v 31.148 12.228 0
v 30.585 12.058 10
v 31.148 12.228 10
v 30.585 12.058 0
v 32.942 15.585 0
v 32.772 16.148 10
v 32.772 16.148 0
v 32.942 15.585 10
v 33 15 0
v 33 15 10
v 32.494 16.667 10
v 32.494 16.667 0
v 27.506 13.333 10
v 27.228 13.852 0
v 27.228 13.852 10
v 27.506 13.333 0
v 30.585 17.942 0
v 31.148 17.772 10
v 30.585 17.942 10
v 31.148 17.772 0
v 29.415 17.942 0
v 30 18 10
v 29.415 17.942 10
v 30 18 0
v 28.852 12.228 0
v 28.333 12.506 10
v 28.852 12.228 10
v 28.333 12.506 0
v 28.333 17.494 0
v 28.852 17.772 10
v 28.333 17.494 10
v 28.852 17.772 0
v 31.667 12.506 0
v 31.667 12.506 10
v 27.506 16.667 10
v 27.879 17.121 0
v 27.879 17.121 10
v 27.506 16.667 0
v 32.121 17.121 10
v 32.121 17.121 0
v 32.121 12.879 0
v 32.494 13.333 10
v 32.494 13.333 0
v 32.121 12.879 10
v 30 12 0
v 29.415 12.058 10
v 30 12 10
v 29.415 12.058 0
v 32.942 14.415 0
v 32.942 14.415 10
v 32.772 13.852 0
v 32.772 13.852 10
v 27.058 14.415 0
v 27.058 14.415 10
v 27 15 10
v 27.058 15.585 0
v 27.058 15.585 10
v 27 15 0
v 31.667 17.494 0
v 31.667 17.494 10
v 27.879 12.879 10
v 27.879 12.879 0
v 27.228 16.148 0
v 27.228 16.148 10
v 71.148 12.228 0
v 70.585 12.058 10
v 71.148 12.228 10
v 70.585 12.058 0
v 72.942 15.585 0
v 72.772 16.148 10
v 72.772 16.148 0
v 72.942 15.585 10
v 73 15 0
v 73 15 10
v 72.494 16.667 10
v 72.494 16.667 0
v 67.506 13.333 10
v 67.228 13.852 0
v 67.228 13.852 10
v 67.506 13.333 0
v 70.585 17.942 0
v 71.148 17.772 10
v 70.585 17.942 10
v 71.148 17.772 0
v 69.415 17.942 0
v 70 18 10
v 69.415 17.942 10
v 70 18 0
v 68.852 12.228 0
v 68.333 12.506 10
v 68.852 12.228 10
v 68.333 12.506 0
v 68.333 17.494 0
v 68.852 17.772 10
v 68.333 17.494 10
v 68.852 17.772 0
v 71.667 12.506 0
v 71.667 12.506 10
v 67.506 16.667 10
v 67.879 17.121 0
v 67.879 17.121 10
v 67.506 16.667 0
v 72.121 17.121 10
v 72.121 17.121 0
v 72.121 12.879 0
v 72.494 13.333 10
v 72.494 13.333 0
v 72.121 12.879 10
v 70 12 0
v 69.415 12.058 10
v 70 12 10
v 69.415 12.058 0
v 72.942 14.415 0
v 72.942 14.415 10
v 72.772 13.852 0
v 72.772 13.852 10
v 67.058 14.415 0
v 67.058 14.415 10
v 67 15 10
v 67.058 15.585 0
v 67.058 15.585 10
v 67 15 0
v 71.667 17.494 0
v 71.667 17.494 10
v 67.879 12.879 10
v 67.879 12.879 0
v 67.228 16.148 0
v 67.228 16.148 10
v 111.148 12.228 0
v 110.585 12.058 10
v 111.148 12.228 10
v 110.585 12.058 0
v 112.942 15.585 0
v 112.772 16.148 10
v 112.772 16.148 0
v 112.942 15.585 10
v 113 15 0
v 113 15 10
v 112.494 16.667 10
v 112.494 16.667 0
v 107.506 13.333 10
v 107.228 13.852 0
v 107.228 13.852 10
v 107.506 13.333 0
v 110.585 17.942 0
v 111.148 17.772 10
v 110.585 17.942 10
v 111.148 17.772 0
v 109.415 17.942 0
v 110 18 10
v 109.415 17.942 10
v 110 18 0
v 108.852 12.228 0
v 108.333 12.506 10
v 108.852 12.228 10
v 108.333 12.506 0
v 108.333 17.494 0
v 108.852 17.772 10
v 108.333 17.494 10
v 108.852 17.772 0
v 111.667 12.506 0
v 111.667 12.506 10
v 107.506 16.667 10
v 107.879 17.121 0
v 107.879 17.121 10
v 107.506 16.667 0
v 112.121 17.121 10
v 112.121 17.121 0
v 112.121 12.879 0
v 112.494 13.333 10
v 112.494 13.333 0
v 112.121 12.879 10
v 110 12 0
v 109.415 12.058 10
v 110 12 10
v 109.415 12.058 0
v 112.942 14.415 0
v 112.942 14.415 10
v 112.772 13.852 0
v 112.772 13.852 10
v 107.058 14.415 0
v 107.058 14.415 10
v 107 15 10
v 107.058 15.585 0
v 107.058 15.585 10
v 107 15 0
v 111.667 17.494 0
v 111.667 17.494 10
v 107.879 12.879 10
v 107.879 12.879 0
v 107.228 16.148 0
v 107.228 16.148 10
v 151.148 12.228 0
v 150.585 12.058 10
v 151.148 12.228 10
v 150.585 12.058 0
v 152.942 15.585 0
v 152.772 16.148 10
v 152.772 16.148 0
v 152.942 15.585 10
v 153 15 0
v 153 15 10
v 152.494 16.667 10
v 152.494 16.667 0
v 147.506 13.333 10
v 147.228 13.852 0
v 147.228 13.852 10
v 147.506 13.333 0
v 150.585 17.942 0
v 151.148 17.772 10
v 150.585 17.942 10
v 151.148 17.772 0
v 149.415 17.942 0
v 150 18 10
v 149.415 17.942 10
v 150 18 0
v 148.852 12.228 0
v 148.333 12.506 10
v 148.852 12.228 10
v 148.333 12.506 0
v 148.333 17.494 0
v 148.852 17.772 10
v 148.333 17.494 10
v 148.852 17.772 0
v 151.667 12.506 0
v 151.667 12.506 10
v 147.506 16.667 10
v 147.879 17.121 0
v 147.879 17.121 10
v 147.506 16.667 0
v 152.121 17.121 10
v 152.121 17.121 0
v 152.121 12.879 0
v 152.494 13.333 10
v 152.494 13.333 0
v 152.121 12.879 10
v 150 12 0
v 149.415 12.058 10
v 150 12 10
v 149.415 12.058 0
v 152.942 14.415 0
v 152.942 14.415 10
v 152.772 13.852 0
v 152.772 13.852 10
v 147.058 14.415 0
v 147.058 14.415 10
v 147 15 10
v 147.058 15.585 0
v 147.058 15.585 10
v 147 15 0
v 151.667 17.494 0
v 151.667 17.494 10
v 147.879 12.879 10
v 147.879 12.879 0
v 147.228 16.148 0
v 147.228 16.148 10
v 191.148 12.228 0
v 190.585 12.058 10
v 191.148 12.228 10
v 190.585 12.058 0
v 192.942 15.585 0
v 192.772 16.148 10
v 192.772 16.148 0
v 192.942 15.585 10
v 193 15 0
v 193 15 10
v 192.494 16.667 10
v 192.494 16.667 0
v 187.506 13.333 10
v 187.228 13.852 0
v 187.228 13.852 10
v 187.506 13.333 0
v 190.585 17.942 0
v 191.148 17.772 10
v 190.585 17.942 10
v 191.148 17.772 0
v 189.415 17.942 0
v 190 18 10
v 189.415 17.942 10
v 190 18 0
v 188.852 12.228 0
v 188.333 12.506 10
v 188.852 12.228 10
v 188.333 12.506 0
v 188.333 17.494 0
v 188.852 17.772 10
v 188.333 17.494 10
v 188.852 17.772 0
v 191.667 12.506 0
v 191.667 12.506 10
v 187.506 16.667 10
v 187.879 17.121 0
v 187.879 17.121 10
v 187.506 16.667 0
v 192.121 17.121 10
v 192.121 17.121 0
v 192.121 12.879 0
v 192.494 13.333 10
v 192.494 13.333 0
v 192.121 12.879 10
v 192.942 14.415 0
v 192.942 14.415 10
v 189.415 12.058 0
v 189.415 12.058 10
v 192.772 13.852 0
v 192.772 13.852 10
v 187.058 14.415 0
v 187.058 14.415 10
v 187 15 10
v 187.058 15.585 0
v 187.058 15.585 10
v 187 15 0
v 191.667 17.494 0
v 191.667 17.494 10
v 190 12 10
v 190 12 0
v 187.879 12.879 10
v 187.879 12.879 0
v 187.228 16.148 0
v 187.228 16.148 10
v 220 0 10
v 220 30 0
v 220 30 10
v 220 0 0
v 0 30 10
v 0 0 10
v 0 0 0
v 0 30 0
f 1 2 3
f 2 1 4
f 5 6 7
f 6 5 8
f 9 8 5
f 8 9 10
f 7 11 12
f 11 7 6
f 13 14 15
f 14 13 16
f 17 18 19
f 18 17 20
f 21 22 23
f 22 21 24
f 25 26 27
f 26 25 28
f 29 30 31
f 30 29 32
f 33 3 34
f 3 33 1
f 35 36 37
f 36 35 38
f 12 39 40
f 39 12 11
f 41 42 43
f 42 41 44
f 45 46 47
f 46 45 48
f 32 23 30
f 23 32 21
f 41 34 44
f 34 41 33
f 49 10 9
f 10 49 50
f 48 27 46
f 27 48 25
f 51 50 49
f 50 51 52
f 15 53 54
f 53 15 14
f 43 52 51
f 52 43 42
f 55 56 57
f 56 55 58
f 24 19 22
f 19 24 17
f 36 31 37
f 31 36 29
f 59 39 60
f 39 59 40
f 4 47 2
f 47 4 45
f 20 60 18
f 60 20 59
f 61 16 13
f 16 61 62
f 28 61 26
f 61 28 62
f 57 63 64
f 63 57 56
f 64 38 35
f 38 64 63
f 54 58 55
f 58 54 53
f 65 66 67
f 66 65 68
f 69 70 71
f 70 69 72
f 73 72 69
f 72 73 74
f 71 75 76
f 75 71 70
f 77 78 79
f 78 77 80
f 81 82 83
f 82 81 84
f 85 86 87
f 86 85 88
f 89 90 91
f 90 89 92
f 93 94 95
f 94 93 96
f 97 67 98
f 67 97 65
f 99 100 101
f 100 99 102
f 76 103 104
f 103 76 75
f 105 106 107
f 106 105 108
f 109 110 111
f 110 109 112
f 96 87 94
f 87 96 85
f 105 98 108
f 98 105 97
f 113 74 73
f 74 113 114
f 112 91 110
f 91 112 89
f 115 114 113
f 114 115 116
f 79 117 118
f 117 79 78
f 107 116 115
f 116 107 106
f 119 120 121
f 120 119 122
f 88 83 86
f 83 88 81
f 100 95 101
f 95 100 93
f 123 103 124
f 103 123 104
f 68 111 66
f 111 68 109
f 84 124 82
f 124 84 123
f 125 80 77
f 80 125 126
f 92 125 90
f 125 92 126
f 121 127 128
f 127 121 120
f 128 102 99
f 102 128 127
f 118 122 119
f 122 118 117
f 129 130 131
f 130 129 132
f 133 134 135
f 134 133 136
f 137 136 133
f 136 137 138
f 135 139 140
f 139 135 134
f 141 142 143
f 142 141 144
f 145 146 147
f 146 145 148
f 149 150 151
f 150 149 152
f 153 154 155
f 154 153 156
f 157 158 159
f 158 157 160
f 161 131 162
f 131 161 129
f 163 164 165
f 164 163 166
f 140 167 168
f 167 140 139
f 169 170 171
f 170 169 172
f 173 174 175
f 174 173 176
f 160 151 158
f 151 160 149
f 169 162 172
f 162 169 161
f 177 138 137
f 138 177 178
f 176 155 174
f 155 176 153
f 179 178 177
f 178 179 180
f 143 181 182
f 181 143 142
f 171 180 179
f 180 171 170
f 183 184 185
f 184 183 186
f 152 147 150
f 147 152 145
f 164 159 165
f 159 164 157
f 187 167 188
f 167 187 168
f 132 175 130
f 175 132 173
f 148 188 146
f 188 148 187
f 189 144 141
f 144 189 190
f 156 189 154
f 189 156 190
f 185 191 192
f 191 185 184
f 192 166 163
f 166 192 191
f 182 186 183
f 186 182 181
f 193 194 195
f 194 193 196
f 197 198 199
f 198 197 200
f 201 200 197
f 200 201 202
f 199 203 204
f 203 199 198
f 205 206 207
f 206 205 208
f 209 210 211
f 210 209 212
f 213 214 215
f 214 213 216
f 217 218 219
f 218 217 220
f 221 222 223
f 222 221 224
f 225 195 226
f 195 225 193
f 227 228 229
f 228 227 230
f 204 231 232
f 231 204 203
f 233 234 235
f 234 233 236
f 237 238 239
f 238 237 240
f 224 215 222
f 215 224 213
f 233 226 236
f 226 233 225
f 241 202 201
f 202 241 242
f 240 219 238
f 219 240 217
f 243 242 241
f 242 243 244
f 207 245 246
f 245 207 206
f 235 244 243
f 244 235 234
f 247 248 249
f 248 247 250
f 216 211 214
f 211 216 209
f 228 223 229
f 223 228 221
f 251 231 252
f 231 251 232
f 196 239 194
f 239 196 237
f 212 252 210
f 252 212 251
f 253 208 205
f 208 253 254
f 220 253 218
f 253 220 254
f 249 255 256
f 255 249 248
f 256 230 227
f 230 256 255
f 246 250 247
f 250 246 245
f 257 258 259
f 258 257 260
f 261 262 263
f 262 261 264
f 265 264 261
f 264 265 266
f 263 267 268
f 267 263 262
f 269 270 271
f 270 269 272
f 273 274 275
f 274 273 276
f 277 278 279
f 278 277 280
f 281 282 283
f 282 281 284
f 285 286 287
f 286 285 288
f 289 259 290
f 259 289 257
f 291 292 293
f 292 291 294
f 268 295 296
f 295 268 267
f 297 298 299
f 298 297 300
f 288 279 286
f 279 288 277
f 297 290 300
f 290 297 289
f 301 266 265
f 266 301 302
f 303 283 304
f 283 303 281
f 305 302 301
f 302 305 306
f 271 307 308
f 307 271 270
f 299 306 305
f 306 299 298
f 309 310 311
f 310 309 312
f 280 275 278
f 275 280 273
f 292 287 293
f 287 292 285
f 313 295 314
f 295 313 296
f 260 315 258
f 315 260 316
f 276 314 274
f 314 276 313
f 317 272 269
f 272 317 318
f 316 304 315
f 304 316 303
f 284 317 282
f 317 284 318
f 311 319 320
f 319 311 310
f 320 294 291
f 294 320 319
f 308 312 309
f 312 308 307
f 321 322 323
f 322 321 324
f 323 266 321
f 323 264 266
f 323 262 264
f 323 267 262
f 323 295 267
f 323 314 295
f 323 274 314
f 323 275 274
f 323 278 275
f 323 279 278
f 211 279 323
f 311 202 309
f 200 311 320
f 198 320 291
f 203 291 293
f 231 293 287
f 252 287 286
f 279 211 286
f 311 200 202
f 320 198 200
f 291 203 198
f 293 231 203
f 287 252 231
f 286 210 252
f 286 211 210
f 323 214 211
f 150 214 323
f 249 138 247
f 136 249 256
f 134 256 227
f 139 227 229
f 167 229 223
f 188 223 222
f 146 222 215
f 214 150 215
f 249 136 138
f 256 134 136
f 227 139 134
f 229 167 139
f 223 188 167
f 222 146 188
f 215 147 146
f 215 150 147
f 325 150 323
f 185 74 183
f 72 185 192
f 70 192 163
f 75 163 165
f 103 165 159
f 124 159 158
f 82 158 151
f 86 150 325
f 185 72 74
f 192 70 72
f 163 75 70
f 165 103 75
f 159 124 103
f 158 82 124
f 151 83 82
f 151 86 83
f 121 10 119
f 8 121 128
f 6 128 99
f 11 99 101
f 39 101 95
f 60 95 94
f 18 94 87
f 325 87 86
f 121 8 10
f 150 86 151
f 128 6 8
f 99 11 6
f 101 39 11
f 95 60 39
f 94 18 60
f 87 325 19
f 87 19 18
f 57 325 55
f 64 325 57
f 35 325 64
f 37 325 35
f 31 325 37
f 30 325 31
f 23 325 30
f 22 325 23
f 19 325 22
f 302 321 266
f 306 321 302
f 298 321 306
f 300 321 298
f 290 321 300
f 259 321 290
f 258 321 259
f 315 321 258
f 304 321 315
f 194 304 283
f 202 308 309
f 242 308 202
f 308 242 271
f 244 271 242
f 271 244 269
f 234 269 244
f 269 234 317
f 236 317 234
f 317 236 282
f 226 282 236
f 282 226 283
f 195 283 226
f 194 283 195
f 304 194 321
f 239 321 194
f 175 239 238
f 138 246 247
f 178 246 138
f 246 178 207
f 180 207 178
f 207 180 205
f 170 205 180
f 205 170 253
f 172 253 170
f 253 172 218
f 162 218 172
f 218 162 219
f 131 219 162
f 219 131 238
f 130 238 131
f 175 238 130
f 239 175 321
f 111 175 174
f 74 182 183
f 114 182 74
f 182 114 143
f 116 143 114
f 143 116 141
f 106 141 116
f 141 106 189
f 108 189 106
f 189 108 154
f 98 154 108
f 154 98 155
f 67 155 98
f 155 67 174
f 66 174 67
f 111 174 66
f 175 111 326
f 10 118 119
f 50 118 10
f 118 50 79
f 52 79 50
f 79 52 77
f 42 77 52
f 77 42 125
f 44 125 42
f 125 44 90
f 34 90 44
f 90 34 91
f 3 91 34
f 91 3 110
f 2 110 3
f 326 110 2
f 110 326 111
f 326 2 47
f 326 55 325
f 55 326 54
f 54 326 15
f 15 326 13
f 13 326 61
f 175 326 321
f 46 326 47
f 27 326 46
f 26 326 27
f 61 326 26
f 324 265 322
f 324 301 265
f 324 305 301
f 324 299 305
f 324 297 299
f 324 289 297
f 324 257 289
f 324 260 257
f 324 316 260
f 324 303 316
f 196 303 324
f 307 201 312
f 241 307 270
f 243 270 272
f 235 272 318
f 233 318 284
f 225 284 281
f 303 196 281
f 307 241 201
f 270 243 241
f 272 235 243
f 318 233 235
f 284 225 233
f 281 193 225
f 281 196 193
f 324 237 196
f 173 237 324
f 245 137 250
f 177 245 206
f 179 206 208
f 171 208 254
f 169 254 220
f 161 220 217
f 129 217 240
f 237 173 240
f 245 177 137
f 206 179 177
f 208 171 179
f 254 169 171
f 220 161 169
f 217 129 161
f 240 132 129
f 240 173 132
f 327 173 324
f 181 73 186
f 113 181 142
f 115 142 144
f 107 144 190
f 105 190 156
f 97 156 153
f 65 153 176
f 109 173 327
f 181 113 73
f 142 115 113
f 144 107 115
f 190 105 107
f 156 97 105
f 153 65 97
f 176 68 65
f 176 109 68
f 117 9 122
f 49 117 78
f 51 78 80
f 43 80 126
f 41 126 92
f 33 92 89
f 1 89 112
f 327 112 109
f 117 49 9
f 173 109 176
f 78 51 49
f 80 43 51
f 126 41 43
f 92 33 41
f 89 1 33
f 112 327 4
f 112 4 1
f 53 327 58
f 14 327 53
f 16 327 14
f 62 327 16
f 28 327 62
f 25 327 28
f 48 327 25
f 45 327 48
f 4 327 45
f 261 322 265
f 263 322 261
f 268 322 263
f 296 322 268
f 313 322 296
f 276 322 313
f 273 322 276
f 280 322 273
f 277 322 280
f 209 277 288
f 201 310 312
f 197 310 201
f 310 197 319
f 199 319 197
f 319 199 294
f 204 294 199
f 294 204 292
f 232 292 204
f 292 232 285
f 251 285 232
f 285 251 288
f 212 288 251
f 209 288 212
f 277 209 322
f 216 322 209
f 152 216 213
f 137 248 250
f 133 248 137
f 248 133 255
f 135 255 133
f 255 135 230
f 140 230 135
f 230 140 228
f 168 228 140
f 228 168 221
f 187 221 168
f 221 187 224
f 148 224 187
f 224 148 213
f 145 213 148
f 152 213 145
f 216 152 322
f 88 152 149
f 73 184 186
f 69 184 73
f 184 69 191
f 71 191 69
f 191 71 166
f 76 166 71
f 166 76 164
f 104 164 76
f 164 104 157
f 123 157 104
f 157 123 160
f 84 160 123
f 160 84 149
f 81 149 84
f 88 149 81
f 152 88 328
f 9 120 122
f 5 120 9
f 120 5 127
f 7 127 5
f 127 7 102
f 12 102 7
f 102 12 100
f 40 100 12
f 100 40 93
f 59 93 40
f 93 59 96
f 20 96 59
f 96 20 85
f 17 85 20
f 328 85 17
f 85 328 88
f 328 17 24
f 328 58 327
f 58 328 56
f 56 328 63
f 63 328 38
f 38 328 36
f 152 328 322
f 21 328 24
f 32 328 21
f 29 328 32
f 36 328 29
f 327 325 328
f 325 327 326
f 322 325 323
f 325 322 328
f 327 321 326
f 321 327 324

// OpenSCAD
$fn = 32;

// ----------------------------------------------------------------------
// Long rail: 200-250 mm mounting rail
// ----------------------------------------------------------------------

// --- parameters (mm) ---
rail_l = 220;             // rail length, X
rail_w = 30;              // rail width, Y
rail_t = 10;              // rail thickness, Z
hole_d = 6;               // mounting hole diameter
hole_start = 30;          // first hole offset from the end
hole_pitch = 40;          // hole pitch
holes = 5;                // number of holes

difference() {
  cube([rail_l, rail_w, rail_t]);
  for (i = [0 : holes - 1])
    translate([hole_start + i * hole_pitch, rail_w / 2, -1])
      cylinder(h = rail_t + 2, d = hole_d);
}
